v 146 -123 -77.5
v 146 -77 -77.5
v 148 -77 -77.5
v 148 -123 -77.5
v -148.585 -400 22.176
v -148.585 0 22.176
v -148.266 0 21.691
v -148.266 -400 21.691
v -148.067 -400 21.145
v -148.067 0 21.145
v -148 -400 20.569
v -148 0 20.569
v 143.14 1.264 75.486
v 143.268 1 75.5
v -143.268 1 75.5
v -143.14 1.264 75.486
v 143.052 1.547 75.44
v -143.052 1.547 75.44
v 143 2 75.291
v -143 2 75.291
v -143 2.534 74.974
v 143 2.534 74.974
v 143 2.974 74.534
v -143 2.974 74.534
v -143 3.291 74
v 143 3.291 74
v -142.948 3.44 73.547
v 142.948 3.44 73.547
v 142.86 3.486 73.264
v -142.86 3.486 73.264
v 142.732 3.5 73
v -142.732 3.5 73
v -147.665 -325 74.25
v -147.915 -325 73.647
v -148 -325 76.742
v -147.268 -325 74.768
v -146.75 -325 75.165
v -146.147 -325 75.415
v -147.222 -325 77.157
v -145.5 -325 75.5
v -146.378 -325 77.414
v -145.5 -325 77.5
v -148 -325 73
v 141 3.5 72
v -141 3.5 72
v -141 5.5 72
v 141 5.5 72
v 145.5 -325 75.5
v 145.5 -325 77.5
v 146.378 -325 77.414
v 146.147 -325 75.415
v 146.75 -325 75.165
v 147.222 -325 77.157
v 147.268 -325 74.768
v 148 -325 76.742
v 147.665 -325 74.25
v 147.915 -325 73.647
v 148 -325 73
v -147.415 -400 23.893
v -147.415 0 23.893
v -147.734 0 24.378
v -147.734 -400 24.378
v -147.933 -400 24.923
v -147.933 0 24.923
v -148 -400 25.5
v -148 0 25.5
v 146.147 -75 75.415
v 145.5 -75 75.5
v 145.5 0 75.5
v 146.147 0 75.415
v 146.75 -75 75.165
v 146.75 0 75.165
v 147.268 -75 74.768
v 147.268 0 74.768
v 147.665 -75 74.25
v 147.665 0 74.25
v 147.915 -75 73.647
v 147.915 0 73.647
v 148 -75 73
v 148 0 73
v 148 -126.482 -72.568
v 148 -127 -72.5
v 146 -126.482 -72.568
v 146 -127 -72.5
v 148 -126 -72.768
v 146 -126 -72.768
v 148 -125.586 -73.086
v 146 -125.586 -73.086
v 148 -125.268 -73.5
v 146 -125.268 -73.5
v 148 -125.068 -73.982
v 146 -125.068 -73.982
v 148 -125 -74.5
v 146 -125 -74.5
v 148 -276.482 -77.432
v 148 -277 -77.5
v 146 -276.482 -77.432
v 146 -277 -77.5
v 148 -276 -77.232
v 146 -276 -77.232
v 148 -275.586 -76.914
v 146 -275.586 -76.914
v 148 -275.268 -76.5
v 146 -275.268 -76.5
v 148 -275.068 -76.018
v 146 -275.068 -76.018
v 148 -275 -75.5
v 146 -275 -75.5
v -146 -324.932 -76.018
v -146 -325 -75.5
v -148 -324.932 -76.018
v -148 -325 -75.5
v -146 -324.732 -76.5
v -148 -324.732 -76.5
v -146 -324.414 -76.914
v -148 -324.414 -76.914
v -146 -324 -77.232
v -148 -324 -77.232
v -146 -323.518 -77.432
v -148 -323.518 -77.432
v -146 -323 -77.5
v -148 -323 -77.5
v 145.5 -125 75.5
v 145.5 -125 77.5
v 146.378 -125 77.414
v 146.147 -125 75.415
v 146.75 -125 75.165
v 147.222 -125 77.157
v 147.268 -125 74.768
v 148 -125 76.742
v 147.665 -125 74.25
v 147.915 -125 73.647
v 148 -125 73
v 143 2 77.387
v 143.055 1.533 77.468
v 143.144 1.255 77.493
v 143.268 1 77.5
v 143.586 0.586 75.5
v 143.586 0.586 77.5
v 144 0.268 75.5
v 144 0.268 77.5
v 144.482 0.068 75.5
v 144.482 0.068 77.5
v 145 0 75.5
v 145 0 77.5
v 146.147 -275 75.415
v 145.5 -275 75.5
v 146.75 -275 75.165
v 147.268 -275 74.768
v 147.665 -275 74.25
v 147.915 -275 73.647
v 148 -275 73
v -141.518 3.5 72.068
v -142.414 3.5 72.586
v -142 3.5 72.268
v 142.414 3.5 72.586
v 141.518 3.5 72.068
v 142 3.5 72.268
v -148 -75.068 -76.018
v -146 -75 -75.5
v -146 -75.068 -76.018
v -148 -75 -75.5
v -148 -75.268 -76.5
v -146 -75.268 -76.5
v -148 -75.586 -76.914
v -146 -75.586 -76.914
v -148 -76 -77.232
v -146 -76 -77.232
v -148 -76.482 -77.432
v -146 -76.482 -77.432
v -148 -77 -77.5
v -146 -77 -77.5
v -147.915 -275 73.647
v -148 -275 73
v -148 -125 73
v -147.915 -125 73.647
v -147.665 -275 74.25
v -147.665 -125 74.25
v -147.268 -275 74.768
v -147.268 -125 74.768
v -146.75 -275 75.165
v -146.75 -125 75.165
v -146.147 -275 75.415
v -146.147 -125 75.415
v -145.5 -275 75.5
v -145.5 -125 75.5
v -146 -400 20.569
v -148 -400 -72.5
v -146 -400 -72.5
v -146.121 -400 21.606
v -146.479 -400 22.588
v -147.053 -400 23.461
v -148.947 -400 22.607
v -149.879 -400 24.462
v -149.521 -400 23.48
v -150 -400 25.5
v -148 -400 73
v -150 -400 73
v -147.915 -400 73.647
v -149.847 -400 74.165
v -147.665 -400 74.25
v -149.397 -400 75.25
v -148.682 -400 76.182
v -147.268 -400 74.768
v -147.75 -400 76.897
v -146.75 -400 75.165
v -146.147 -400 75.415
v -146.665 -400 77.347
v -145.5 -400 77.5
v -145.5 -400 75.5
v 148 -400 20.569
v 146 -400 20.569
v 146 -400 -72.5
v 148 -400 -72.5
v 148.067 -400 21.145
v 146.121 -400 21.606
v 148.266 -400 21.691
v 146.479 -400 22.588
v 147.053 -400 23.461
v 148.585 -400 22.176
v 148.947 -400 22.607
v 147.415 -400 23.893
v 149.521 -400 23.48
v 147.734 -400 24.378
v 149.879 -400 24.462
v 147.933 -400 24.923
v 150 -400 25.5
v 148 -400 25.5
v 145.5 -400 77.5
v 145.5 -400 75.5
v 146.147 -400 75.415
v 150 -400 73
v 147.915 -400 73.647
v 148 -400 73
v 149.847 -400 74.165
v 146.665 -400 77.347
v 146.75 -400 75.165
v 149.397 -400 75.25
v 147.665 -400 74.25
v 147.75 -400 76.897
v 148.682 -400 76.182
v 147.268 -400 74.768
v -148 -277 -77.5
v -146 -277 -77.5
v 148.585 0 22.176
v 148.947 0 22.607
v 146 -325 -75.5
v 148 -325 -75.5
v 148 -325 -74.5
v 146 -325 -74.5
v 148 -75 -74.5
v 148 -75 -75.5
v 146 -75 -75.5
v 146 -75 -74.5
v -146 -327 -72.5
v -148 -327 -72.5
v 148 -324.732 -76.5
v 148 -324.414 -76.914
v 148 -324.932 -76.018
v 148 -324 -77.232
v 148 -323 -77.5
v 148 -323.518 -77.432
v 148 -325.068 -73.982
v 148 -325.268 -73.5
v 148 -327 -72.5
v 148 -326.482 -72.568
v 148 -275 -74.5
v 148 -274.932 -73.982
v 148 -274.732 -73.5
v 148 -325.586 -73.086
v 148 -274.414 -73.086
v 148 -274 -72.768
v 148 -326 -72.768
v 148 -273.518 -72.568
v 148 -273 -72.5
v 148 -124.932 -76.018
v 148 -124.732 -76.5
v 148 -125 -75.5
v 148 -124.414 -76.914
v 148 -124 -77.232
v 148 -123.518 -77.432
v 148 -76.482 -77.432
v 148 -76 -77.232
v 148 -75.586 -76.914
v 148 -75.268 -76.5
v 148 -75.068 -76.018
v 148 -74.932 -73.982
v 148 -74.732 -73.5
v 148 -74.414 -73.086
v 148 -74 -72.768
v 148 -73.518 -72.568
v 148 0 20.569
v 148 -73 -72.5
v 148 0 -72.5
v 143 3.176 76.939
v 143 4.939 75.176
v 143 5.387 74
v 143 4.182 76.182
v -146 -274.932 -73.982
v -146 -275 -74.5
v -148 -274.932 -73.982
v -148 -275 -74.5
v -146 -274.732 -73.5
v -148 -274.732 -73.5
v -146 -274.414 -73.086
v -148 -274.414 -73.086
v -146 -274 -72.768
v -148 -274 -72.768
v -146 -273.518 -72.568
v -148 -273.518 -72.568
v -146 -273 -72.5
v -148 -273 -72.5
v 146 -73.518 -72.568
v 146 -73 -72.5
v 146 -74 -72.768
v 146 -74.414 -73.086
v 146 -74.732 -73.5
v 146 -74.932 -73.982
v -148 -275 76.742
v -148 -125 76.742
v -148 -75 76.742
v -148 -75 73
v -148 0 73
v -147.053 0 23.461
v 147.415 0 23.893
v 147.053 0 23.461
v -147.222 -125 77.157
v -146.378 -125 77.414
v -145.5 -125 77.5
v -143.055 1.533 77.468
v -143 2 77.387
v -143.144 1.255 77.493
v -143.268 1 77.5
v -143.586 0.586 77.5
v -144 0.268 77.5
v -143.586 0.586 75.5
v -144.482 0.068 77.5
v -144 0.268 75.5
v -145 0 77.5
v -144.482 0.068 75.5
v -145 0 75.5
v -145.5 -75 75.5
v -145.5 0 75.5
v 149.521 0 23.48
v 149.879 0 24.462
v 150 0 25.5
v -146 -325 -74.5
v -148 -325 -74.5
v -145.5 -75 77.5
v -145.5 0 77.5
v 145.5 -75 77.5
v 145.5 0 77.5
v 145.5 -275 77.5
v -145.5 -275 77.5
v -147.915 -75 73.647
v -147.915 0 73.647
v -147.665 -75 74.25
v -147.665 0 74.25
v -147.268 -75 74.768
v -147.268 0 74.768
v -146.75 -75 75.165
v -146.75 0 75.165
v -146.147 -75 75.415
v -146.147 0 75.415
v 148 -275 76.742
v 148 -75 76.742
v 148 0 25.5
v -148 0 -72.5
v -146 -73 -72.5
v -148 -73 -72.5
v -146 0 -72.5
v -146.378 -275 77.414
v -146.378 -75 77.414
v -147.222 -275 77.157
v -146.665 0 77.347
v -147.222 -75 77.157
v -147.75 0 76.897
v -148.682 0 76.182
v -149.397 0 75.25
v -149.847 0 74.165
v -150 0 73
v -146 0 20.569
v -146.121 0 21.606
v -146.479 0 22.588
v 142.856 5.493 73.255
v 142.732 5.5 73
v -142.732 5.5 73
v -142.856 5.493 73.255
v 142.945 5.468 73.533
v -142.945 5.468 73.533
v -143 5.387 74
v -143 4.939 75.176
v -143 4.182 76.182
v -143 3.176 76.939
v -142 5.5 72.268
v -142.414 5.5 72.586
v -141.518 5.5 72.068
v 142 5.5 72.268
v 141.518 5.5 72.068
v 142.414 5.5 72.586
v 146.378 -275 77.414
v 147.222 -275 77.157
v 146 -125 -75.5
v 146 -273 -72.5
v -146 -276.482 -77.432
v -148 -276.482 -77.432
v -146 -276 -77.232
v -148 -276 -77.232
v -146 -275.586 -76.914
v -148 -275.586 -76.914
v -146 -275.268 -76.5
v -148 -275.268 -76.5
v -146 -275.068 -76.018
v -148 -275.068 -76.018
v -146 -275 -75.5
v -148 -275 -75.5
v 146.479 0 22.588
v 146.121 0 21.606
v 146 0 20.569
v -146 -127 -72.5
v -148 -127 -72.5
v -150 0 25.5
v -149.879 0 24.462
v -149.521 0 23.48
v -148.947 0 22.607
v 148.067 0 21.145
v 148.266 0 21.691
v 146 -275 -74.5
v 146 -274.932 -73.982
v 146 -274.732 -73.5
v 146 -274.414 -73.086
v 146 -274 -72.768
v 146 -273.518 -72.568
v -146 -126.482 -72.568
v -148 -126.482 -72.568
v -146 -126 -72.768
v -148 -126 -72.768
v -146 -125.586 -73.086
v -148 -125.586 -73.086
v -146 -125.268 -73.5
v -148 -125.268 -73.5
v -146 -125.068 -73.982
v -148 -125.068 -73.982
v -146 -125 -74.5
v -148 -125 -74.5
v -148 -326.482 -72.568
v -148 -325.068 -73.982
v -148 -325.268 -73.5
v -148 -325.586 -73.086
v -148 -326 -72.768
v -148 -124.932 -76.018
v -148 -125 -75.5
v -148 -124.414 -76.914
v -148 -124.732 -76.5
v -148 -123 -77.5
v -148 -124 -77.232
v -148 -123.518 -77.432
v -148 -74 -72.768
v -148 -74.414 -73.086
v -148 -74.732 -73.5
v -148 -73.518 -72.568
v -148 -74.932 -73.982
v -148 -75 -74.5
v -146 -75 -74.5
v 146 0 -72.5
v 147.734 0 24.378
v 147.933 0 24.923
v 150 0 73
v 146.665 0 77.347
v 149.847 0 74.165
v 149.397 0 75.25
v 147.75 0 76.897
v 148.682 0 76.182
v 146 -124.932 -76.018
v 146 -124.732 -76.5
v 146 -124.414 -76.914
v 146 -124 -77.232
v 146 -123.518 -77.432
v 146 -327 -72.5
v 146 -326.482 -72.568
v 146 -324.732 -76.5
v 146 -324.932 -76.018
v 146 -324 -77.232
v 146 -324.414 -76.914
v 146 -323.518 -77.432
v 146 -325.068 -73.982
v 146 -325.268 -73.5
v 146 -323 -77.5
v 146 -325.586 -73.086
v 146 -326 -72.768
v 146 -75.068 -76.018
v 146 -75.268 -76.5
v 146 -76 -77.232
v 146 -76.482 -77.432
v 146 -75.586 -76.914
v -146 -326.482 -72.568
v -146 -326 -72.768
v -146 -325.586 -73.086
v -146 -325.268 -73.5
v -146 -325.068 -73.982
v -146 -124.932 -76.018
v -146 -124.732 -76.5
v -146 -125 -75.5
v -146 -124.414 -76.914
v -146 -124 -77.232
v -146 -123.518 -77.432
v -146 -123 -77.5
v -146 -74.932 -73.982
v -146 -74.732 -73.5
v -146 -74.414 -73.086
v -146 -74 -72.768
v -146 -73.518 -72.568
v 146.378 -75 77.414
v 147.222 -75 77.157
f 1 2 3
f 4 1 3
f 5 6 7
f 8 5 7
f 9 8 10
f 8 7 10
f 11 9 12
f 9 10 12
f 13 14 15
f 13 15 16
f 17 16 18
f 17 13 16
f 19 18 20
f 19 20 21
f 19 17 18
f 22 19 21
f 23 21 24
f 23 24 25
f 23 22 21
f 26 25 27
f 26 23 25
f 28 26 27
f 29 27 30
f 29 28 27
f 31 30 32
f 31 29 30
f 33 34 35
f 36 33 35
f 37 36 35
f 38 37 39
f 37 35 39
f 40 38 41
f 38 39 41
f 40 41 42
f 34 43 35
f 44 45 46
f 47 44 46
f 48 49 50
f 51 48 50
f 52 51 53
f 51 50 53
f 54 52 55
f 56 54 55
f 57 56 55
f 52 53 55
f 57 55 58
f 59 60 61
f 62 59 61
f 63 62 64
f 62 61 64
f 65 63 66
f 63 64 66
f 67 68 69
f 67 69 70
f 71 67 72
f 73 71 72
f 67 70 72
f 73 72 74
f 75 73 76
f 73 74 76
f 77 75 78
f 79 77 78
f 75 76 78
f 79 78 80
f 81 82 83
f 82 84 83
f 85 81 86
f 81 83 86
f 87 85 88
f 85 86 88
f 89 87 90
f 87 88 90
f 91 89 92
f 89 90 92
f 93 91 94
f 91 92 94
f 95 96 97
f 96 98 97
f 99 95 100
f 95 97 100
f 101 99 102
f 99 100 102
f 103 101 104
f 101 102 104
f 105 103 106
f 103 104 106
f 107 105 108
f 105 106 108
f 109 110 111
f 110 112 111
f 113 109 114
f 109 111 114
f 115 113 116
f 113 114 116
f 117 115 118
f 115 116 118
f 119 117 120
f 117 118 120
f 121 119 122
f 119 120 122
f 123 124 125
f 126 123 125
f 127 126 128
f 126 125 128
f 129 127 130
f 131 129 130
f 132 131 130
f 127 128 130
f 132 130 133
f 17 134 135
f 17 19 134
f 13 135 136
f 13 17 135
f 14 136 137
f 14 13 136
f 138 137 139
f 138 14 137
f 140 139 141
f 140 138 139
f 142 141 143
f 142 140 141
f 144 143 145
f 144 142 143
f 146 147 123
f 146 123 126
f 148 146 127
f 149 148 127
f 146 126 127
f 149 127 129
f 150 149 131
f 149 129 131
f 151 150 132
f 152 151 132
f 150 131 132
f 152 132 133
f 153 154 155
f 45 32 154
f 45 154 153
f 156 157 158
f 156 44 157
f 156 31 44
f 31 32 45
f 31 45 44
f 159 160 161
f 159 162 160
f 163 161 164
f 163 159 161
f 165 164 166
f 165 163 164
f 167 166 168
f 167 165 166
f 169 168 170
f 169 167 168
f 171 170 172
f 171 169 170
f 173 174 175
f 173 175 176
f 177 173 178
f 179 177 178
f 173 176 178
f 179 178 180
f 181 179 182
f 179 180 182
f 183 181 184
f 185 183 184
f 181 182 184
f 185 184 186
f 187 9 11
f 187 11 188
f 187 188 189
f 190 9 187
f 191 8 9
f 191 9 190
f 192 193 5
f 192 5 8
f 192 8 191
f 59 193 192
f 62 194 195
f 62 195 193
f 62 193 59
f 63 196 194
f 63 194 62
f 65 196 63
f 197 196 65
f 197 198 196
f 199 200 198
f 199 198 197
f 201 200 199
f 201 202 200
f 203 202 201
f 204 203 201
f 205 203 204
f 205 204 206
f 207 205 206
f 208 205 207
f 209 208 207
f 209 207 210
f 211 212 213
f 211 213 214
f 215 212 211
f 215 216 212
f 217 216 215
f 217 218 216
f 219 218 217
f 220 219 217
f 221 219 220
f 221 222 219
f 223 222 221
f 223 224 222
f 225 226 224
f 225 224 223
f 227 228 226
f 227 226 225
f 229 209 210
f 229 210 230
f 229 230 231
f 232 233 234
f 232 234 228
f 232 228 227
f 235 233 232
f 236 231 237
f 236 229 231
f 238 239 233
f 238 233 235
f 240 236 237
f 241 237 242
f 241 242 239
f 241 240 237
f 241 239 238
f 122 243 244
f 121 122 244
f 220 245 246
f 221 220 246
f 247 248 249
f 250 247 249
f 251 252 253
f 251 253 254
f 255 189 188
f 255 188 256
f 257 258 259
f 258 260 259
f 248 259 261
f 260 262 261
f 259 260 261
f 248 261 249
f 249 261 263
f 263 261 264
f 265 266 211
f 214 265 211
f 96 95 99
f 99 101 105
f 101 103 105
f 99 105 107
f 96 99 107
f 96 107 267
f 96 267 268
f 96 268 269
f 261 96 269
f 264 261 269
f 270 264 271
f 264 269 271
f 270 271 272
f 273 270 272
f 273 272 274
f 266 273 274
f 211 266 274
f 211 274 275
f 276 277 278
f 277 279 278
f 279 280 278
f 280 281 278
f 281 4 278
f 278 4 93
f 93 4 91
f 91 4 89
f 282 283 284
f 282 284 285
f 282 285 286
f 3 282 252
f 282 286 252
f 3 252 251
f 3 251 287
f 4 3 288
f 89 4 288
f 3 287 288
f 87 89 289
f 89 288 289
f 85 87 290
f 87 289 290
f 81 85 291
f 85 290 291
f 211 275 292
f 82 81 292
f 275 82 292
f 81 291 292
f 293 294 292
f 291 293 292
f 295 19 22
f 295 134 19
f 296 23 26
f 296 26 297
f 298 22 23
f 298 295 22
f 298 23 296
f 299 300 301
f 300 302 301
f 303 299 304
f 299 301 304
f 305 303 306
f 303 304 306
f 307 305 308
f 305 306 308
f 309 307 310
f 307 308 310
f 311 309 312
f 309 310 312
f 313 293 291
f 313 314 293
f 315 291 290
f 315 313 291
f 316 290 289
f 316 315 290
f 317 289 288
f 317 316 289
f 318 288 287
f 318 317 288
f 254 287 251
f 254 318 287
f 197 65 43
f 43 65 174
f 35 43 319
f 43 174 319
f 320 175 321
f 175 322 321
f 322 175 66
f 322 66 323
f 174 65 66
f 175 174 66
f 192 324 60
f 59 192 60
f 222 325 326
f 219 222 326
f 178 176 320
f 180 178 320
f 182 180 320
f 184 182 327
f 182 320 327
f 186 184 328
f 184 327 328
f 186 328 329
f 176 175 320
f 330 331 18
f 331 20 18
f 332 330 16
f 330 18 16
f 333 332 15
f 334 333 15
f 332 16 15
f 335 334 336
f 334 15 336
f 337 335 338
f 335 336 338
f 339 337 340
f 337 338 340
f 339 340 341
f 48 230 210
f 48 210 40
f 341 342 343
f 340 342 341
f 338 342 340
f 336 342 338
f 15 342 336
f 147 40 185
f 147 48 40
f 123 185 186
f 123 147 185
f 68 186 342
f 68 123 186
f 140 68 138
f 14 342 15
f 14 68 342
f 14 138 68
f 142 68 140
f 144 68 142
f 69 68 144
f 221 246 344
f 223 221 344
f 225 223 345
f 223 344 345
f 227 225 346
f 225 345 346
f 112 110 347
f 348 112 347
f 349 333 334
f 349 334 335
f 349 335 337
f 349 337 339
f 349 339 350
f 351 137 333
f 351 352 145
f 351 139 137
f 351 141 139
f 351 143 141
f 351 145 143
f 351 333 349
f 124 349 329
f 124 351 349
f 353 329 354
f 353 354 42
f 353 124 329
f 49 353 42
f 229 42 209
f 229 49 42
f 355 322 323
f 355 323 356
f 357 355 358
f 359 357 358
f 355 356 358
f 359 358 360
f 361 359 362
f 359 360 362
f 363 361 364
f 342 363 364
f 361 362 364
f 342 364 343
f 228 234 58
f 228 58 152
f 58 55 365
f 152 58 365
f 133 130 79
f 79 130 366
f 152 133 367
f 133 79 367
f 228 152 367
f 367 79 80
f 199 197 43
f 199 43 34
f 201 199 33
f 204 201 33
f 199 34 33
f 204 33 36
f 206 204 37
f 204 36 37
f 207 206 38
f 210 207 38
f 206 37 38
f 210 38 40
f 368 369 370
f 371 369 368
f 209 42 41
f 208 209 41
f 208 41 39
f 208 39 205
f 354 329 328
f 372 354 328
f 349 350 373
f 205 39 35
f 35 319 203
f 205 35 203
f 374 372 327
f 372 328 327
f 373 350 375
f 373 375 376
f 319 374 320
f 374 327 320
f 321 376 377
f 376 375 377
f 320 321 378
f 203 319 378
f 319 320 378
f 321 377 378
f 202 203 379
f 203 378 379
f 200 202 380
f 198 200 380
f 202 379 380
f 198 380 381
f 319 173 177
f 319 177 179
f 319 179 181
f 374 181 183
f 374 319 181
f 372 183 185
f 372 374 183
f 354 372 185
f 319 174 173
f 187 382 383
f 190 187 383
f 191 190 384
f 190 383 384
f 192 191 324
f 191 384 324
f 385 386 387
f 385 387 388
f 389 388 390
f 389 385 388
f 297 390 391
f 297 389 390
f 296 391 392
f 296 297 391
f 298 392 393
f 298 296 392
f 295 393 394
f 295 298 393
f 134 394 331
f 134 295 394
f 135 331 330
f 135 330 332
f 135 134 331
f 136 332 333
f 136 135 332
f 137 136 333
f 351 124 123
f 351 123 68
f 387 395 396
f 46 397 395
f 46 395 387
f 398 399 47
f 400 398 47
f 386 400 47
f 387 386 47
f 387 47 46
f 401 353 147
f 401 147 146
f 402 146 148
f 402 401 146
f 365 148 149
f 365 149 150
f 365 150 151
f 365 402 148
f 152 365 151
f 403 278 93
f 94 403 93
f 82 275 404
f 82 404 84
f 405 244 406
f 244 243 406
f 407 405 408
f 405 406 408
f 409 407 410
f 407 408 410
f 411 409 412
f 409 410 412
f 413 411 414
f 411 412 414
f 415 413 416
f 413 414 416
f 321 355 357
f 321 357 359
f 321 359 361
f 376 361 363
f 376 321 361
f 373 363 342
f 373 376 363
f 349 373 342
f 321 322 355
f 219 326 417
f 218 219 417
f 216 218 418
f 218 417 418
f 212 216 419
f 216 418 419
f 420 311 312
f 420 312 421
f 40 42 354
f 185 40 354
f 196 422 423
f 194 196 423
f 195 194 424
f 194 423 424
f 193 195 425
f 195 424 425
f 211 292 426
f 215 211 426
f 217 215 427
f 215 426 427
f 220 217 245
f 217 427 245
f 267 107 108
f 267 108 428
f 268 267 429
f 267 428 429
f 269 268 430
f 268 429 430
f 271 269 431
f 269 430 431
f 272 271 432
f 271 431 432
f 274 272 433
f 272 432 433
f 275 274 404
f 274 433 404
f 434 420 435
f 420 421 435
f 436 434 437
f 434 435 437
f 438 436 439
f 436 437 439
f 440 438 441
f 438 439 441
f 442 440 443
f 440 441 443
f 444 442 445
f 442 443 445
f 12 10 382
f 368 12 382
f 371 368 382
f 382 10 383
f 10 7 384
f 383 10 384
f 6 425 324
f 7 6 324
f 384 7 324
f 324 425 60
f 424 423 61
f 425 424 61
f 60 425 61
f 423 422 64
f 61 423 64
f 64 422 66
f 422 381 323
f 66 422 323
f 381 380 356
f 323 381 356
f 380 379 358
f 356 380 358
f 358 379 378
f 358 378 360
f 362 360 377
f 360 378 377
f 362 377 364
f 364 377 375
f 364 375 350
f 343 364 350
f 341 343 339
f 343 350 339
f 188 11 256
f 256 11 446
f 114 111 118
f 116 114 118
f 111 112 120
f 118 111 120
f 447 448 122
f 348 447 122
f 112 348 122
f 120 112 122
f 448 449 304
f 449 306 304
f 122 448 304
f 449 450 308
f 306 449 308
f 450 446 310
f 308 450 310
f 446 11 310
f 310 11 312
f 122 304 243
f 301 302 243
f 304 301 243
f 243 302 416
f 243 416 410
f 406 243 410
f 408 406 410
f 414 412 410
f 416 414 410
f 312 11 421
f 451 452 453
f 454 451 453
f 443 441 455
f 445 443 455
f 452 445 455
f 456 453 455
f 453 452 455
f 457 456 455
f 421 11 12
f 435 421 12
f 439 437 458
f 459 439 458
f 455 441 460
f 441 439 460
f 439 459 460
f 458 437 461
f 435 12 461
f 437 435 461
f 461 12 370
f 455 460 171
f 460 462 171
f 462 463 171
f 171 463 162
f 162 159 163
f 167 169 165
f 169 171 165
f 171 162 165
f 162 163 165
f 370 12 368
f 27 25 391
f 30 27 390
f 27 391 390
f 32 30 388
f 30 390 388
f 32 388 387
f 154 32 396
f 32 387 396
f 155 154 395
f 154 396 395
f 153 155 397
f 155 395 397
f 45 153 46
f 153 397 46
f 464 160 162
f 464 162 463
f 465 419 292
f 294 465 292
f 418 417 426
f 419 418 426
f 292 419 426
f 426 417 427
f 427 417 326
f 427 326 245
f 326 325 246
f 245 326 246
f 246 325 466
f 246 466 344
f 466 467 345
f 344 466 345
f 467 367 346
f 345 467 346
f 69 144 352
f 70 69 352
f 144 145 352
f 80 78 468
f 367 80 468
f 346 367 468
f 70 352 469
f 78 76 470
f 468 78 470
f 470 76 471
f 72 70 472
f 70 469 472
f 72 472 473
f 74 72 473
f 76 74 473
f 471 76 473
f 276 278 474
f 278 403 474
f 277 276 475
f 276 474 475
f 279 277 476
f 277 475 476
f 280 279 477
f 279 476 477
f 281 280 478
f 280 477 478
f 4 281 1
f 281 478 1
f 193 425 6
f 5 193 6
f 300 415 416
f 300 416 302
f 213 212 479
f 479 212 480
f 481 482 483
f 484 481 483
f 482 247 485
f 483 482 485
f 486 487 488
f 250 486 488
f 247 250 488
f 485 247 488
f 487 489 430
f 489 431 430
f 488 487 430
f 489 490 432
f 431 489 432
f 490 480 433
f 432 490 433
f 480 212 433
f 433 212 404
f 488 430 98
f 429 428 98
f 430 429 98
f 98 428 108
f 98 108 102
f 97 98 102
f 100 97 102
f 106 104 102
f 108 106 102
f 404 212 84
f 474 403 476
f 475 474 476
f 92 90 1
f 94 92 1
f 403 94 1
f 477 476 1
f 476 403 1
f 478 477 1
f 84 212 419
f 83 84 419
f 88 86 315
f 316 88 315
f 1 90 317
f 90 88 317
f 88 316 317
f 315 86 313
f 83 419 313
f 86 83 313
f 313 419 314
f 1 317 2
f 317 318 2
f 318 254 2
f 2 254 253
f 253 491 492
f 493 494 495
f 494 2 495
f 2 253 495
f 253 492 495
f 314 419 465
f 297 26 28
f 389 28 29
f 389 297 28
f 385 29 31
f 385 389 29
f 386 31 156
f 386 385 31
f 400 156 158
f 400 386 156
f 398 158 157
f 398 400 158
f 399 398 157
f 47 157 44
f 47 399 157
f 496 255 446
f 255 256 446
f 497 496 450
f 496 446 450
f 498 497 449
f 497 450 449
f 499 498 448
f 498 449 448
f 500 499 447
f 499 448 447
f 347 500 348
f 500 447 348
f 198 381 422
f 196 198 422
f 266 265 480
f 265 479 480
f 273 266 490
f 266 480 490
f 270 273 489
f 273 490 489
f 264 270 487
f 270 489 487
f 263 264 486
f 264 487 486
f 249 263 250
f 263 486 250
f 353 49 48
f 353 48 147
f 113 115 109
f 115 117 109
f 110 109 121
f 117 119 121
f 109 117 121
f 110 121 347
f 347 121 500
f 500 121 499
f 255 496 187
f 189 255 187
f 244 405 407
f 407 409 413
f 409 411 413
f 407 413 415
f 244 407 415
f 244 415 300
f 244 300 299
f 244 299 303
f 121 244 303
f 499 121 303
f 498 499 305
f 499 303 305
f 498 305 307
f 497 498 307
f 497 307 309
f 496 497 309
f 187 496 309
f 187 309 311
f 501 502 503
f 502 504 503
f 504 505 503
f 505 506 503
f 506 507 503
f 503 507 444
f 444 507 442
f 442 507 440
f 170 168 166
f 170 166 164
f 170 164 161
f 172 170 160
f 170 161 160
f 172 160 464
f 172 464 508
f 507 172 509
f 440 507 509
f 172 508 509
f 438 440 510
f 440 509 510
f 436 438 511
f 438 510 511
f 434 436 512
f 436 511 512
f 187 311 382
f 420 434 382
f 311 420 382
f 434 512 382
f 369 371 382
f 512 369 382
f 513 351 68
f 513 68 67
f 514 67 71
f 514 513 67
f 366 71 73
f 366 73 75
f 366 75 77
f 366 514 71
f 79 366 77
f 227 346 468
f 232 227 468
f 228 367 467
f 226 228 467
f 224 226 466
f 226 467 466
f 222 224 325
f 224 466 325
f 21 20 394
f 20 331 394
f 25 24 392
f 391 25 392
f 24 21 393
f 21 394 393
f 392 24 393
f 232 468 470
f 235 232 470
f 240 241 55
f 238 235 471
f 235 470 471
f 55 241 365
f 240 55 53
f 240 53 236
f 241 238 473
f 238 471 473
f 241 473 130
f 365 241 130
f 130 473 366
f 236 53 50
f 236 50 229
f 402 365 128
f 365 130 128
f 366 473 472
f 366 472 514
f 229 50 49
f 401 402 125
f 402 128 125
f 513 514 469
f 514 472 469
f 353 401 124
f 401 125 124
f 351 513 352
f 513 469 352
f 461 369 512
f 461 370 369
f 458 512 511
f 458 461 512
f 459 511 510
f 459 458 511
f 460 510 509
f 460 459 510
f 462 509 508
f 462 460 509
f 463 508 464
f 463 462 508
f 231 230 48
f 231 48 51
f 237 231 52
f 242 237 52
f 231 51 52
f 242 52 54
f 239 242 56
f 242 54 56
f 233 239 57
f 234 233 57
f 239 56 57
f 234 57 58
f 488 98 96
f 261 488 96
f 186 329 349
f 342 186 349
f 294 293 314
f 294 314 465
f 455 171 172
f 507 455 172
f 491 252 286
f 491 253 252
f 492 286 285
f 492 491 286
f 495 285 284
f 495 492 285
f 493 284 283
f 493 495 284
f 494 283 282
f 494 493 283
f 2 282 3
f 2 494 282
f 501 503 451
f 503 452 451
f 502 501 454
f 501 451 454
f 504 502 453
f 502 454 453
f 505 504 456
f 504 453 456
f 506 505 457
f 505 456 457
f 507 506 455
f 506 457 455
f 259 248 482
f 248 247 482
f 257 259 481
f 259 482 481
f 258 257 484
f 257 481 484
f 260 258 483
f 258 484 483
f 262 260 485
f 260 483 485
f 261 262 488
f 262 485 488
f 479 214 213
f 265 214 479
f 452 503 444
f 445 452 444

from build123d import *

# Parameters (mm, degrees)
F1_DEPTH      = 400
F2_W          = 150
F2_H          = 5
F2_W_2        = 75
F3_DEPTH      = 645
F4_W          = 2.5
F4_H          = 50
F5_DEPTH      = 21
F6_R          = 2
F8_DEPTH      = 143
F8_DEPTH_BACK = 143
F9_R          = 2


with BuildPart() as f1:
    # F0 (on Front) → F1 (new body)
    with BuildSketch(Plane.XZ):
        with BuildLine():
            ThreePointArc((150, 73), (148.6819805153, 76.1819805153), (145.5, 77.5))
            Line((145.5, 77.5), (0, 77.5))
            Line((0, 77.5), (-145.5, 77.5))
            ThreePointArc((-145.5, 77.5), (-148.6819805153, 76.1819805153), (-150, 73))
            Line((-150, 73), (-150, 25.5))
            ThreePointArc((-150, 25.5), (-149.7286167935, 23.960909355), (-148.947199994, 22.6074557564))
            Line((-148.947199994, 22.6074557564), (-148.5848888922, 22.1756701992))
            ThreePointArc((-148.5848888922, 22.1756701992), (-148.150768448, 21.4237515333), (-148, 20.5687011749))
            Line((-148, 20.5687011749), (-148, -77.5))
            Line((-148, -77.5), (-146, -77.5))
            Line((-146, -77.5), (-146, 20.5687011749))
            ThreePointArc((-146, 20.5687011749), (-146.2713832065, 22.1077918199), (-147.052800006, 23.4612454185))
            Line((-147.052800006, 23.4612454185), (-147.4151111078, 23.8930309758))
            ThreePointArc((-147.4151111078, 23.8930309758), (-147.849231552, 24.6449496417), (-148, 25.5))
            Line((-148, 25.5), (-148, 73))
            ThreePointArc((-148, 73), (-147.267766953, 74.767766953), (-145.5, 75.5))
            Line((-145.5, 75.5), (0, 75.5))
            Line((0, 75.5), (145.5, 75.5))
            ThreePointArc((145.5, 75.5), (147.267766953, 74.767766953), (148, 73))
            Line((148, 73), (148, 25.5))
            ThreePointArc((148, 25.5), (147.849231552, 24.6449496417), (147.4151111078, 23.8930309758))
            Line((147.4151111078, 23.8930309758), (147.052800006, 23.4612454185))
            ThreePointArc((147.052800006, 23.4612454185), (146.2713832065, 22.1077918199), (146, 20.5687011749))
            Line((146, 20.5687011749), (146, -77.5))
            Line((146, -77.5), (148, -77.5))
            Line((148, -77.5), (148, 20.5687011749))
            ThreePointArc((148, 20.5687011749), (148.150768448, 21.4237515333), (148.5848888922, 22.1756701992))
            Line((148.5848888922, 22.1756701992), (148.947199994, 22.6074557564))
            ThreePointArc((148.947199994, 22.6074557564), (149.7286167935, 23.960909355), (150, 25.5))
            Line((150, 25.5), (150, 73))
        make_face()
    extrude(amount=F1_DEPTH)

    # F2 (on face) → F3 (cut)
    with BuildSketch(Plane.YZ.offset(148)):
        with Locations((-200, -75)):
            Rectangle(F2_W, F2_H)
        with Locations((-37.5, -75)):
            Rectangle(F2_W_2, F2_H)
        with Locations((-362.5, -75)):
            Rectangle(F2_W_2, F2_H)
    extrude(amount=-F3_DEPTH, mode=Mode.SUBTRACT)

    # F4 (on face) → F5 (cut)
    with BuildSketch(Plane.XY.offset(77.5)):
        with Locations((146.75, -100)):
            Rectangle(F4_W, F4_H)
        with Locations((146.75, -300)):
            Rectangle(F4_W, F4_H)
        with Locations((-146.75, -100)):
            Rectangle(F4_W, F4_H)
        with Locations((-146.75, -300)):
            Rectangle(F4_W, F4_H)
    extrude(amount=-F5_DEPTH, mode=Mode.SUBTRACT)

    # F6
    f6_edges = [f1.edges().sort_by_distance(p)[0] for p in [
        (147, -125, -72.5),
        (147, -325, -72.5),
        (-147, -325, -72.5),
        (-147, -125, -72.5),
        (147, -75, -72.5),
        (147, -275, -72.5),
        (-147, -275, -72.5),
        (-147, -75, -72.5),
        (147, -325, -77.5),
        (147, -125, -77.5),
        (-147, -325, -77.5),
        (-147, -125, -77.5),
        (147, -275, -77.5),
        (147, -75, -77.5),
        (-147, -275, -77.5),
        (-147, -75, -77.5),
    ]]
    fillet(f6_edges, radius=F6_R)

    # F7 (on Right) → F8 (join, two sides)
    with BuildSketch(Plane.YZ) as f8_sk:
        with BuildLine():
            Line((1, 77.5), (0, 77.5))
            Line((0, 77.5), (0, 75.5))
            Line((0, 75.5), (1, 75.5))
            ThreePointArc((1, 75.5), (2.767766953, 74.767766953), (3.5, 73))
            Line((3.5, 73), (3.5, 72))
            Line((3.5, 72), (5.5, 72))
            Line((5.5, 72), (5.5, 73))
            ThreePointArc((5.5, 73), (4.1819805153, 76.1819805153), (1, 77.5))
        make_face()
    extrude(amount=F8_DEPTH)
    extrude(f8_sk.sketch, amount=-F8_DEPTH_BACK)

    # F9 (call 1 of 4: OpenCascade refuses the feature's edges together)
    f9_edges = [f1.edges().sort_by_distance(p)[0] for p in [
        (143, 0, 76.5),
    ]]
    fillet(f9_edges, radius=F9_R)

    # F9#2 (call 2 of 4)
    f9_2_edges = [f1.edges().sort_by_distance(p)[0] for p in [
        (-143, 0, 76.5),
    ]]
    fillet(f9_2_edges, radius=F9_R)

    # F9#3 (call 3 of 4)
    f9_3_edges = [f1.edges().sort_by_distance(p)[0] for p in [
        (-143, 4.5, 72),
    ]]
    fillet(f9_3_edges, radius=F9_R)

    # F9#4 (call 4 of 4)
    f9_4_edges = [f1.edges().sort_by_distance(p)[0] for p in [
        (143, 4.5, 72),
    ]]
    fillet(f9_4_edges, radius=F9_R)


solid = f1.part
